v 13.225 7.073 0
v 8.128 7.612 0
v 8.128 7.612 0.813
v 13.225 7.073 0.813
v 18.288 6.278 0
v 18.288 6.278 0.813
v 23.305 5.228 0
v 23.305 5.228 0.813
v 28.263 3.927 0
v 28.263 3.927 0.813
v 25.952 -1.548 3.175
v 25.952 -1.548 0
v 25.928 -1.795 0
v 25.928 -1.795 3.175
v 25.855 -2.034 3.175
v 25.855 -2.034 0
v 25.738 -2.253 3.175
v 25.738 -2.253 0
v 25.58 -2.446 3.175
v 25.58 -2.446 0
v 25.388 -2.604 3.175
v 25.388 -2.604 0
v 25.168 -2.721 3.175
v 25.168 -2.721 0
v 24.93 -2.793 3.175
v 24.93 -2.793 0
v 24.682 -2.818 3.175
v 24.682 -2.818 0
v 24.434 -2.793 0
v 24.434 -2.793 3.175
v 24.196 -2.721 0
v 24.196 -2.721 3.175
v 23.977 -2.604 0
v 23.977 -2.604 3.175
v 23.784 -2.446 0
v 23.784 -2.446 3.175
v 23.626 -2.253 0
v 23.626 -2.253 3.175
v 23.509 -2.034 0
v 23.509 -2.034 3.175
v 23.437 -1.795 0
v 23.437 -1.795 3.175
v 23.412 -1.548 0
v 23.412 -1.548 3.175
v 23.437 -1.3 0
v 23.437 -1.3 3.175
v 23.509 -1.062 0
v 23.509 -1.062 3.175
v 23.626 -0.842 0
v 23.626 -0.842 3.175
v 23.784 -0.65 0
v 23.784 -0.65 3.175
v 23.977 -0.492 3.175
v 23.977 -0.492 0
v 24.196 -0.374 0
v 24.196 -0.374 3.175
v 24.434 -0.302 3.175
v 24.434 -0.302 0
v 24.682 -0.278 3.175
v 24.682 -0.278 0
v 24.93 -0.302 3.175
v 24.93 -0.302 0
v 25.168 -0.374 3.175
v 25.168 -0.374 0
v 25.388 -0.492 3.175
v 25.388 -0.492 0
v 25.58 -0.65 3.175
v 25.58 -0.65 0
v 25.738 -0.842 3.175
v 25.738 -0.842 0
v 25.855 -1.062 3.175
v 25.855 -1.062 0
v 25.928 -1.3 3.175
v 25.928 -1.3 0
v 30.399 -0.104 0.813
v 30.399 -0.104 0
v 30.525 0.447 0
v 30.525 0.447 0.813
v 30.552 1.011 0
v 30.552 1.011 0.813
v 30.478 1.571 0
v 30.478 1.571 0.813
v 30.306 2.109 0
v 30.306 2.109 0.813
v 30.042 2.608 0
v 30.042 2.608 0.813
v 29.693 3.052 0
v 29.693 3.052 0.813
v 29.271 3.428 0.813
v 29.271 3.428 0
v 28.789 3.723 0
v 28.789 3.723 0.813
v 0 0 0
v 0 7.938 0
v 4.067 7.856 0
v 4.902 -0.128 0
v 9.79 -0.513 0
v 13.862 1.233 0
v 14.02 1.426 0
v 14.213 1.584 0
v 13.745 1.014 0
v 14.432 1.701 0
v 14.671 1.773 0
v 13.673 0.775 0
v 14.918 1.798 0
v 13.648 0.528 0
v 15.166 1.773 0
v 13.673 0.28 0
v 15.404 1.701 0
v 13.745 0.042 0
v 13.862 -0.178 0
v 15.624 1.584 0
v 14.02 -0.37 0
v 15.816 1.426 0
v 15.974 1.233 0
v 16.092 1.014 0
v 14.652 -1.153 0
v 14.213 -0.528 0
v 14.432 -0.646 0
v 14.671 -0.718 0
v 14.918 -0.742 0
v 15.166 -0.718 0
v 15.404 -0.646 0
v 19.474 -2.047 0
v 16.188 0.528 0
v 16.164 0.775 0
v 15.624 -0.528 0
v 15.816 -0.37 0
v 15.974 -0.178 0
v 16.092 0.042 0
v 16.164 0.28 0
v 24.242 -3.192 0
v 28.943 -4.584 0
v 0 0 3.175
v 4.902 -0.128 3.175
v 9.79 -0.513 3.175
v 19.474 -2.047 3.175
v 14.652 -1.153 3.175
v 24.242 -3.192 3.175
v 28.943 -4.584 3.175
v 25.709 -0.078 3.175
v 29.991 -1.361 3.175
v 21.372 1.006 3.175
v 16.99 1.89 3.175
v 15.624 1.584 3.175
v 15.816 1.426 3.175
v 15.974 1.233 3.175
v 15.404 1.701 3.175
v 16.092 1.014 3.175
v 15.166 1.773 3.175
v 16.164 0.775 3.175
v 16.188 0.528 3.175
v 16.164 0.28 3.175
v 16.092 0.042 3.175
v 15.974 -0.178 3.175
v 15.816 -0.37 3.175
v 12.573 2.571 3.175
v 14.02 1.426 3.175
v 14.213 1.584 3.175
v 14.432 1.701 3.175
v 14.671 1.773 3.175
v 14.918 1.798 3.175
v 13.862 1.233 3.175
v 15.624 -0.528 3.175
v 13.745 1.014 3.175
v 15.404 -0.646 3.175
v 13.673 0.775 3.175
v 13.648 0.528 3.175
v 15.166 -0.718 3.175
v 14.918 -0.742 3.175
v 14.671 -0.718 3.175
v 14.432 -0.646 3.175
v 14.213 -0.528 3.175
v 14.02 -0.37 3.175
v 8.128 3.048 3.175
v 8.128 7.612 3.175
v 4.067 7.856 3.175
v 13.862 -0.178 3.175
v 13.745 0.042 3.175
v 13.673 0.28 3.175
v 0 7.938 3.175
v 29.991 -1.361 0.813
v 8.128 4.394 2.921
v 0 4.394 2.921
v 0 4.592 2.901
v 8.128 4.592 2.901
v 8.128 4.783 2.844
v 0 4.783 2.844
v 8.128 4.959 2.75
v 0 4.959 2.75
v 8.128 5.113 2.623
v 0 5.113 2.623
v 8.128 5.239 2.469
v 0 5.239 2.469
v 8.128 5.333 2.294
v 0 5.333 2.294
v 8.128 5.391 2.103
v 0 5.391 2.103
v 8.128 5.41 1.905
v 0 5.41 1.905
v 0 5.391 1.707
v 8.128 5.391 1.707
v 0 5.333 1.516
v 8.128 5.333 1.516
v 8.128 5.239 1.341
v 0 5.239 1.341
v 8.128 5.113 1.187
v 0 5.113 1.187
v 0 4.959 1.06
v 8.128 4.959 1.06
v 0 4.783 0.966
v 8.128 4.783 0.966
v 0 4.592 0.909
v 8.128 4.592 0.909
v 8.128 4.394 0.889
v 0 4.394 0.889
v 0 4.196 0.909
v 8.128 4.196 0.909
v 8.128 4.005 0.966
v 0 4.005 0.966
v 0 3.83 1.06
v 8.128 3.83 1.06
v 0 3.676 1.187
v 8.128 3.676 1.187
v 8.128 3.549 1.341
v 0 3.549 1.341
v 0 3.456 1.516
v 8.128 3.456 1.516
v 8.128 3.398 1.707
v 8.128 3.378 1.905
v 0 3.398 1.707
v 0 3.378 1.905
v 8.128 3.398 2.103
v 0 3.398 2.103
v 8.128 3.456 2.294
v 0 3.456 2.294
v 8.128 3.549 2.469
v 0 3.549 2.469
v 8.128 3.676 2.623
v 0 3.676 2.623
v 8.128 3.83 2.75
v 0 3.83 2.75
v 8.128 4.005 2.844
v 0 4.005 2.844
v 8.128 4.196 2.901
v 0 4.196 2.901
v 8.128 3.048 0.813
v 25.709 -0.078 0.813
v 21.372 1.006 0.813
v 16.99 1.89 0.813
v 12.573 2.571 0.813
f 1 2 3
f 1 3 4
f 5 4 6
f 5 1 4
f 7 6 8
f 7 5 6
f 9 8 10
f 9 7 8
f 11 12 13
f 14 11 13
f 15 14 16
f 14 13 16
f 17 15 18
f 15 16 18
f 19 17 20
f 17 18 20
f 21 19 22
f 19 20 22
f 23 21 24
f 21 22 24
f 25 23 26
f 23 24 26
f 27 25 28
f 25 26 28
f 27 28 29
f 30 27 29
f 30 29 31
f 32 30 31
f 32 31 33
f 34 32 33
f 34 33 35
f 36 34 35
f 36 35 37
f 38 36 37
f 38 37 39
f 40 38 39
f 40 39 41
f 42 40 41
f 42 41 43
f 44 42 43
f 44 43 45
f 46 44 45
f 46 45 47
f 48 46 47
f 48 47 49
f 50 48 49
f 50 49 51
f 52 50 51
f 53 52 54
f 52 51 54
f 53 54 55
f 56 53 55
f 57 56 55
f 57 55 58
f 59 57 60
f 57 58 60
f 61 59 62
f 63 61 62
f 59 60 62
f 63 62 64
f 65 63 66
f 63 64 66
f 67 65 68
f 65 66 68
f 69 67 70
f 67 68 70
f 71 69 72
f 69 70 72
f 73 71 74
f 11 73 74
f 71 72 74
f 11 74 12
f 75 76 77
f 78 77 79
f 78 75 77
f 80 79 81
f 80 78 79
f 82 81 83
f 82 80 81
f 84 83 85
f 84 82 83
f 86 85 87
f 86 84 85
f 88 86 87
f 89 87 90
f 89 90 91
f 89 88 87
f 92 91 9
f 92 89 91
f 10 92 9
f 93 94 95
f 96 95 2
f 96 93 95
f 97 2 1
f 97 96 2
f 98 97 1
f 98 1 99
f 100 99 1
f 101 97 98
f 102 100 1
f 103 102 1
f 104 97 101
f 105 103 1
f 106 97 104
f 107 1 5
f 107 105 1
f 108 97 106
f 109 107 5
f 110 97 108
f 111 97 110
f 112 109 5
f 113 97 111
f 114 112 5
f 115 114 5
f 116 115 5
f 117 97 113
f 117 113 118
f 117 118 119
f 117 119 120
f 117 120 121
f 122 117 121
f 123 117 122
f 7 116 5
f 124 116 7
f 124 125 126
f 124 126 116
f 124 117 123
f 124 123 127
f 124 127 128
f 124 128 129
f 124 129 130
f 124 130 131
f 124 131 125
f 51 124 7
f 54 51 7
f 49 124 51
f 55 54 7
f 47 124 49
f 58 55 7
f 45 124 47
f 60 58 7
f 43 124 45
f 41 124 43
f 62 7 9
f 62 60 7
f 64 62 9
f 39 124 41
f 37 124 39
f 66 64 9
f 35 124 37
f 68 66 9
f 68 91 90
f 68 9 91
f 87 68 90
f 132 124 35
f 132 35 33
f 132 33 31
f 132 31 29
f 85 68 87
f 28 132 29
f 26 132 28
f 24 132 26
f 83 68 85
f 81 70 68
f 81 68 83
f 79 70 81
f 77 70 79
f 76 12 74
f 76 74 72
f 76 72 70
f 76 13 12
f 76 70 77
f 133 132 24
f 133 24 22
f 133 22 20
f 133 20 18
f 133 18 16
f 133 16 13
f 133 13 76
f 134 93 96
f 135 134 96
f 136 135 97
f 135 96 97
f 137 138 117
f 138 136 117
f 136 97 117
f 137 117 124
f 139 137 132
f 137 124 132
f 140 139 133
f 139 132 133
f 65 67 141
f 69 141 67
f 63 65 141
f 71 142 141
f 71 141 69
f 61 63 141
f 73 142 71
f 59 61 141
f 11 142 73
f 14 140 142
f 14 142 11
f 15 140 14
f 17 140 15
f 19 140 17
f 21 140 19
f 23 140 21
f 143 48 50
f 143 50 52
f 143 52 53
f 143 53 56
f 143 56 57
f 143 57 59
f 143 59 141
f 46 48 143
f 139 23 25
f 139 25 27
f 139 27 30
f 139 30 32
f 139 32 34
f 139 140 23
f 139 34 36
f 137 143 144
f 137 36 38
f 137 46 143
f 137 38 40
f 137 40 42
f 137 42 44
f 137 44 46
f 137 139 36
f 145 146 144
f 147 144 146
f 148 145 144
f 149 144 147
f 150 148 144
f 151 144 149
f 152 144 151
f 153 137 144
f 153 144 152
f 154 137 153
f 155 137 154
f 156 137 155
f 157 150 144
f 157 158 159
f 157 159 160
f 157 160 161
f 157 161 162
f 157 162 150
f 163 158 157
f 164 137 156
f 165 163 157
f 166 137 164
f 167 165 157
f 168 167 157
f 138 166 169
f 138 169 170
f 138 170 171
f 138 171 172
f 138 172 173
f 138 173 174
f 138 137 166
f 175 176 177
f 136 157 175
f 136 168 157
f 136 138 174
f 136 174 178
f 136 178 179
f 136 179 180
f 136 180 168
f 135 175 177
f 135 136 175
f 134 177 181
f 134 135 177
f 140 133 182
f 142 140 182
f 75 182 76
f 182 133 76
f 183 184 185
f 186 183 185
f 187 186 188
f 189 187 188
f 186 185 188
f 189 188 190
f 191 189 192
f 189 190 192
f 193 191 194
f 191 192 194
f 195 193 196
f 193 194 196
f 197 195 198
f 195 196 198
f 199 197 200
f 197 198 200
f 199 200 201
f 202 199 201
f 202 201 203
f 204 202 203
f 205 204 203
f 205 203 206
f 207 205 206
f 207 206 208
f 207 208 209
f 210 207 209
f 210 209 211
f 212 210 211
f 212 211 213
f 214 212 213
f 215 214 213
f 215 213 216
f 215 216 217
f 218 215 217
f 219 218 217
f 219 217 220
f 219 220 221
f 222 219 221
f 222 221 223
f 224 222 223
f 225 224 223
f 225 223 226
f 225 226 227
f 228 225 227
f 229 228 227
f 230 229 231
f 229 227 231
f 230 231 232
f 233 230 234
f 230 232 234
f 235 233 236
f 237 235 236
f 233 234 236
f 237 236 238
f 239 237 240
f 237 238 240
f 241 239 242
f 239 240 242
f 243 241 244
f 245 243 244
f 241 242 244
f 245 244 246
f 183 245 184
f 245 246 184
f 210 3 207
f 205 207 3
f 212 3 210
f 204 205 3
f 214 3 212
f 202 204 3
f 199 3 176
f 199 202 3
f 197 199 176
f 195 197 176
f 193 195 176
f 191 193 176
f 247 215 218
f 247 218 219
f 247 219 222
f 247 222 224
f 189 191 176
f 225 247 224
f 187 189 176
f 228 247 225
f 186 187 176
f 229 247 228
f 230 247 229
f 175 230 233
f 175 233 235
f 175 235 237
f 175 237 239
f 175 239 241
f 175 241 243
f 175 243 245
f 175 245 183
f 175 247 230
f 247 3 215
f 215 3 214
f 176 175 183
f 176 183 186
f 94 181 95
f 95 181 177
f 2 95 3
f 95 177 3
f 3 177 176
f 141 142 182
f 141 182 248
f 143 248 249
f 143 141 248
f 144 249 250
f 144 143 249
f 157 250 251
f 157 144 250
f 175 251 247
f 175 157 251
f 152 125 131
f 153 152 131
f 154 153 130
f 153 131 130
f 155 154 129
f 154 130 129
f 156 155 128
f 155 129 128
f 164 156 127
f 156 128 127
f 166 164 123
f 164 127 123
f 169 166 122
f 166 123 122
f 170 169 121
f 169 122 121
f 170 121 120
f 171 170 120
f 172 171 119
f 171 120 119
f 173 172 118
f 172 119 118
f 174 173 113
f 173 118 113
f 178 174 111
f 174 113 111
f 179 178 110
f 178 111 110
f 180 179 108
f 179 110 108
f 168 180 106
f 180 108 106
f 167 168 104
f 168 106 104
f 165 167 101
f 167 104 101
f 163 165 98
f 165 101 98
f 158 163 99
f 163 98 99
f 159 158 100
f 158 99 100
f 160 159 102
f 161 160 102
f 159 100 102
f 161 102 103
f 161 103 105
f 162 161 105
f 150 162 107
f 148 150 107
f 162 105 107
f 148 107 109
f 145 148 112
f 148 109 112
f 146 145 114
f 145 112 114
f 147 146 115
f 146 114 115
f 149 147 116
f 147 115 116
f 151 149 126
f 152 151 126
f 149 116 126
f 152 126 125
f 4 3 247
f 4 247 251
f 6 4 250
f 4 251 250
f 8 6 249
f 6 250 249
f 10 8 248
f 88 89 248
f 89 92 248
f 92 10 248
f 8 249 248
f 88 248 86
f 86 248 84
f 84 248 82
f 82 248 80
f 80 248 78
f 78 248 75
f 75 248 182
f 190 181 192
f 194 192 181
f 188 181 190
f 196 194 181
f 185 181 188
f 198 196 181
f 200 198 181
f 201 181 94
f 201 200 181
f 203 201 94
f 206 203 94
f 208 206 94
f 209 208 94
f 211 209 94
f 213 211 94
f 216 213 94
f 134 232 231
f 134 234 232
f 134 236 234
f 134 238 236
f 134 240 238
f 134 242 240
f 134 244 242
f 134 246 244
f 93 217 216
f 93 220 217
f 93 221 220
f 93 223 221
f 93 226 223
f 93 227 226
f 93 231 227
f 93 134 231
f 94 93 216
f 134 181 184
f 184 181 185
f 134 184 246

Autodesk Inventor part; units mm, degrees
ref_plane "YZ Plane" through (0, 0, 0) normal (1, 0, 0) x (0, 1, 0)
ref_plane "XZ Plane" through (0, 0, 0) normal (0, 1, 0) x (-1, 0, 0)
ref_plane "XY Plane" through (0, 0, 0) normal (0, 0, 1) x (1, 0, 0)
sketch "Sketch1" plane through (0, 0, 0) normal (0, 0, 1) x (1, 0, 0)
  line L0 (0, 0) -> (0, -93.6625)
  line L1 (0, 0) -> (0, 7.9375)
  arc A0 (31.3961, 2.9648) -> (0, 7.9375) centre (0, -93.6625) ccw
  arc A1 (28.9433, -4.5842) -> (0, 0) centre (0, -93.6625) ccw
  line L2 (0, -93.6625) -> (35.0444, 14.1931)
  line L3 (14.9183, 0.5277) -> (0, -93.6625)
  line L4 (14.9183, 0.5277) -> (26.5201, -1.3098)
  circle A2 centre (14.9183, 0.5277) radius 1.27
  line L5 (0, -93.6625) -> (24.6821, -1.5477)
  line L6 (24.6821, -1.5477) -> (28.1101, -2.4662)
  circle A3 centre (24.6821, -1.5477) radius 1.27
  dimension "d0" = 93.6625
  dimension "d1" = 7.9375
  dimension "d2" = 18
  dimension "d5" = 9
  dimension "d28" = 95.3643
  dimension "d29" = 2.54
  dimension "d32" = 6
  dimension "d33" = 95.3643
  dimension "d34" = 2.54
extrude "Extrusion2" add sketch "Sketch1" along normal blind 3.175 contours L1 A0 L2 A1 L5 A3 L4 A2 L3 | L3 A2 L4 A3 L5 A1 | A2 L4 L3 | L3 L4 A2 | A3 L4 L6 L5 | L5 L6 A3 | A3 L4
sketch "Sketch3" plane through (0, 0, 0) normal (-1, 0, 0) x (0, 0, 1)
  line L0 (3.175, 0) -> (3.175, 7.9375) projected
  line L1 (0, 0) -> (3.175, 0) projected
  line L2 (0, 7.9375) -> (3.175, 7.9375)
  line L3 (3.175, 7.9375) -> (3.175, 3.048)
  line L4 (3.175, 3.048) -> (0, 3.048)
  line L5 (0, 3.048) -> (0, 7.9375)
  dimension "d13" = 3.048
extrude "Extrusion3" cut sketch "Sketch3" against normal blind 8.128
sketch "Sketch4" plane through (8.128, 0, 0) normal (-1, 0, 0) x (0, 0, 1)
  line L0 (0, 3.048) -> (0, 7.6119) projected
  line L1 (0, 3.048) -> (3.175, 3.048) projected
  line L2 (3.175, 7.6119) -> (3.175, 3.048) projected
  line L3 (3.175, 7.6119) -> (0.8128, 7.6119)
  line L4 (0.8128, 7.6119) -> (0.8128, 3.048)
  line L5 (0.8128, 3.048) -> (3.175, 3.048)
  line L6 (3.175, 3.048) -> (3.175, 7.6119)
  point P0 (0, 0)
  dimension "d16" = 0.8128
sketch3d "3D Sketch1"
  arc A0 (8.128, 7.6119, 0) -> (31.3961, 2.9648, 0) centre (0, -93.6625, 0) ccw
sweep "Sweep1" cut profiles "Sketch4" path "3D Sketch1"
sketch "Sketch5" plane through (0, 3.048, 3.175) normal (0, 1, 0) x (1, 0, 0)
  line L0 (0, 3.175) -> (8.128, 3.175)
  line L1 (8.128, 3.175) -> (8.128, 0)
  line L2 (8.128, 0) -> (0, 0)
  line L3 (0, 0) -> (0, 3.175)
extrude "Extrusion4" add sketch "Sketch5" along normal blind 4.8895
sketch "Sketch6" plane through (0, 0, 0) normal (-1, 0, 0) x (0, 0, 1)
  line L0 (0, 7.9375) -> (3.175, 7.9375)
  line L1 (3.175, 7.9375) -> (3.175, 8.7188)
  line L2 (3.175, 8.7188) -> (0, 8.7188)
  line L3 (0, 8.7188) -> (0, 7.9375)
sweep "Sweep2" cut profiles "Sketch6" path "Sketch1" path curves L1 A0
sketch "Sketch7" plane through (0, 0, 0) normal (-1, 0, 0) x (0, 0, 1)
  line L0 (0, 0) -> (3.175, 0) projected
  circle A0 centre (1.905, 4.3942) radius 1.016
  line L1 (3.175, 0) -> (3.175, 7.9375) projected
  dimension "d21" = 2.032
  dimension "d22" = 4.3942
  dimension "d25" = 1.27
extrude "Extrusion5" cut sketch "Sketch7" against normal blind 50.8
sketch "Sketch8" plane through (8.128, 3.048, 3.175) normal (1, 0, 0) x (0, 0, -1)
  circle A0 centre (1.27, 1.3462) radius 1.016 projected
  line L0 (2.3622, 4.5639) -> (0, 4.5639) projected
  line L1 (0, 0) -> (0, 4.5639) projected
  line L2 (2.3622, 0) -> (0, 0) projected
  line L3 (2.3622, 0) -> (2.3622, 4.5639) projected
  point P0 (3.175, -3.048)
  dimension "d26" = 1.3462
fillet "Fillet1" radius 3.175 1 edges at (31.3961, 2.9648, 0.4064)
extrude "Extrusion9" cut sketch "Sketch1" along normal blind 12.7 contours A2 L4 L3 | L3 L4 A2 | A3 L4 L6 L5 | L5 L6 A3 | A3 L4
sketch "Sketch10" plane through (0, 0, 3.175) normal (0, 0, 1) x (1, 0, 0)
  circle A0 centre (24.6821, -1.5477) radius 1.27 projected
  circle A1 centre (14.9183, 0.5277) radius 1.27 projected
  arc A2 (8.128, 7.6119) -> (0, 7.9375) centre (0, -93.6625) ccw projected
  line L0 (0, 0) -> (0, 7.9375) projected
  arc A3 (28.9433, -4.5842) -> (0, 0) centre (0, -93.6625) ccw projected
  line L1 (29.9905, -1.3611) -> (28.9433, -4.5842) projected
  arc A4 (29.9905, -1.3611) -> (8.128, 3.048) centre (0, -93.6625) ccw projected
  line L2 (8.128, 3.048) -> (8.128, 7.6119) projected
  dimension "d45" = 14.9183
  dimension "d46" = 24.6821
  dimension "d47" = 0.5277
  dimension "d48" = 1.5477
equation "\"d33\" = d28"
properties part number "FiberClamper_v2"
